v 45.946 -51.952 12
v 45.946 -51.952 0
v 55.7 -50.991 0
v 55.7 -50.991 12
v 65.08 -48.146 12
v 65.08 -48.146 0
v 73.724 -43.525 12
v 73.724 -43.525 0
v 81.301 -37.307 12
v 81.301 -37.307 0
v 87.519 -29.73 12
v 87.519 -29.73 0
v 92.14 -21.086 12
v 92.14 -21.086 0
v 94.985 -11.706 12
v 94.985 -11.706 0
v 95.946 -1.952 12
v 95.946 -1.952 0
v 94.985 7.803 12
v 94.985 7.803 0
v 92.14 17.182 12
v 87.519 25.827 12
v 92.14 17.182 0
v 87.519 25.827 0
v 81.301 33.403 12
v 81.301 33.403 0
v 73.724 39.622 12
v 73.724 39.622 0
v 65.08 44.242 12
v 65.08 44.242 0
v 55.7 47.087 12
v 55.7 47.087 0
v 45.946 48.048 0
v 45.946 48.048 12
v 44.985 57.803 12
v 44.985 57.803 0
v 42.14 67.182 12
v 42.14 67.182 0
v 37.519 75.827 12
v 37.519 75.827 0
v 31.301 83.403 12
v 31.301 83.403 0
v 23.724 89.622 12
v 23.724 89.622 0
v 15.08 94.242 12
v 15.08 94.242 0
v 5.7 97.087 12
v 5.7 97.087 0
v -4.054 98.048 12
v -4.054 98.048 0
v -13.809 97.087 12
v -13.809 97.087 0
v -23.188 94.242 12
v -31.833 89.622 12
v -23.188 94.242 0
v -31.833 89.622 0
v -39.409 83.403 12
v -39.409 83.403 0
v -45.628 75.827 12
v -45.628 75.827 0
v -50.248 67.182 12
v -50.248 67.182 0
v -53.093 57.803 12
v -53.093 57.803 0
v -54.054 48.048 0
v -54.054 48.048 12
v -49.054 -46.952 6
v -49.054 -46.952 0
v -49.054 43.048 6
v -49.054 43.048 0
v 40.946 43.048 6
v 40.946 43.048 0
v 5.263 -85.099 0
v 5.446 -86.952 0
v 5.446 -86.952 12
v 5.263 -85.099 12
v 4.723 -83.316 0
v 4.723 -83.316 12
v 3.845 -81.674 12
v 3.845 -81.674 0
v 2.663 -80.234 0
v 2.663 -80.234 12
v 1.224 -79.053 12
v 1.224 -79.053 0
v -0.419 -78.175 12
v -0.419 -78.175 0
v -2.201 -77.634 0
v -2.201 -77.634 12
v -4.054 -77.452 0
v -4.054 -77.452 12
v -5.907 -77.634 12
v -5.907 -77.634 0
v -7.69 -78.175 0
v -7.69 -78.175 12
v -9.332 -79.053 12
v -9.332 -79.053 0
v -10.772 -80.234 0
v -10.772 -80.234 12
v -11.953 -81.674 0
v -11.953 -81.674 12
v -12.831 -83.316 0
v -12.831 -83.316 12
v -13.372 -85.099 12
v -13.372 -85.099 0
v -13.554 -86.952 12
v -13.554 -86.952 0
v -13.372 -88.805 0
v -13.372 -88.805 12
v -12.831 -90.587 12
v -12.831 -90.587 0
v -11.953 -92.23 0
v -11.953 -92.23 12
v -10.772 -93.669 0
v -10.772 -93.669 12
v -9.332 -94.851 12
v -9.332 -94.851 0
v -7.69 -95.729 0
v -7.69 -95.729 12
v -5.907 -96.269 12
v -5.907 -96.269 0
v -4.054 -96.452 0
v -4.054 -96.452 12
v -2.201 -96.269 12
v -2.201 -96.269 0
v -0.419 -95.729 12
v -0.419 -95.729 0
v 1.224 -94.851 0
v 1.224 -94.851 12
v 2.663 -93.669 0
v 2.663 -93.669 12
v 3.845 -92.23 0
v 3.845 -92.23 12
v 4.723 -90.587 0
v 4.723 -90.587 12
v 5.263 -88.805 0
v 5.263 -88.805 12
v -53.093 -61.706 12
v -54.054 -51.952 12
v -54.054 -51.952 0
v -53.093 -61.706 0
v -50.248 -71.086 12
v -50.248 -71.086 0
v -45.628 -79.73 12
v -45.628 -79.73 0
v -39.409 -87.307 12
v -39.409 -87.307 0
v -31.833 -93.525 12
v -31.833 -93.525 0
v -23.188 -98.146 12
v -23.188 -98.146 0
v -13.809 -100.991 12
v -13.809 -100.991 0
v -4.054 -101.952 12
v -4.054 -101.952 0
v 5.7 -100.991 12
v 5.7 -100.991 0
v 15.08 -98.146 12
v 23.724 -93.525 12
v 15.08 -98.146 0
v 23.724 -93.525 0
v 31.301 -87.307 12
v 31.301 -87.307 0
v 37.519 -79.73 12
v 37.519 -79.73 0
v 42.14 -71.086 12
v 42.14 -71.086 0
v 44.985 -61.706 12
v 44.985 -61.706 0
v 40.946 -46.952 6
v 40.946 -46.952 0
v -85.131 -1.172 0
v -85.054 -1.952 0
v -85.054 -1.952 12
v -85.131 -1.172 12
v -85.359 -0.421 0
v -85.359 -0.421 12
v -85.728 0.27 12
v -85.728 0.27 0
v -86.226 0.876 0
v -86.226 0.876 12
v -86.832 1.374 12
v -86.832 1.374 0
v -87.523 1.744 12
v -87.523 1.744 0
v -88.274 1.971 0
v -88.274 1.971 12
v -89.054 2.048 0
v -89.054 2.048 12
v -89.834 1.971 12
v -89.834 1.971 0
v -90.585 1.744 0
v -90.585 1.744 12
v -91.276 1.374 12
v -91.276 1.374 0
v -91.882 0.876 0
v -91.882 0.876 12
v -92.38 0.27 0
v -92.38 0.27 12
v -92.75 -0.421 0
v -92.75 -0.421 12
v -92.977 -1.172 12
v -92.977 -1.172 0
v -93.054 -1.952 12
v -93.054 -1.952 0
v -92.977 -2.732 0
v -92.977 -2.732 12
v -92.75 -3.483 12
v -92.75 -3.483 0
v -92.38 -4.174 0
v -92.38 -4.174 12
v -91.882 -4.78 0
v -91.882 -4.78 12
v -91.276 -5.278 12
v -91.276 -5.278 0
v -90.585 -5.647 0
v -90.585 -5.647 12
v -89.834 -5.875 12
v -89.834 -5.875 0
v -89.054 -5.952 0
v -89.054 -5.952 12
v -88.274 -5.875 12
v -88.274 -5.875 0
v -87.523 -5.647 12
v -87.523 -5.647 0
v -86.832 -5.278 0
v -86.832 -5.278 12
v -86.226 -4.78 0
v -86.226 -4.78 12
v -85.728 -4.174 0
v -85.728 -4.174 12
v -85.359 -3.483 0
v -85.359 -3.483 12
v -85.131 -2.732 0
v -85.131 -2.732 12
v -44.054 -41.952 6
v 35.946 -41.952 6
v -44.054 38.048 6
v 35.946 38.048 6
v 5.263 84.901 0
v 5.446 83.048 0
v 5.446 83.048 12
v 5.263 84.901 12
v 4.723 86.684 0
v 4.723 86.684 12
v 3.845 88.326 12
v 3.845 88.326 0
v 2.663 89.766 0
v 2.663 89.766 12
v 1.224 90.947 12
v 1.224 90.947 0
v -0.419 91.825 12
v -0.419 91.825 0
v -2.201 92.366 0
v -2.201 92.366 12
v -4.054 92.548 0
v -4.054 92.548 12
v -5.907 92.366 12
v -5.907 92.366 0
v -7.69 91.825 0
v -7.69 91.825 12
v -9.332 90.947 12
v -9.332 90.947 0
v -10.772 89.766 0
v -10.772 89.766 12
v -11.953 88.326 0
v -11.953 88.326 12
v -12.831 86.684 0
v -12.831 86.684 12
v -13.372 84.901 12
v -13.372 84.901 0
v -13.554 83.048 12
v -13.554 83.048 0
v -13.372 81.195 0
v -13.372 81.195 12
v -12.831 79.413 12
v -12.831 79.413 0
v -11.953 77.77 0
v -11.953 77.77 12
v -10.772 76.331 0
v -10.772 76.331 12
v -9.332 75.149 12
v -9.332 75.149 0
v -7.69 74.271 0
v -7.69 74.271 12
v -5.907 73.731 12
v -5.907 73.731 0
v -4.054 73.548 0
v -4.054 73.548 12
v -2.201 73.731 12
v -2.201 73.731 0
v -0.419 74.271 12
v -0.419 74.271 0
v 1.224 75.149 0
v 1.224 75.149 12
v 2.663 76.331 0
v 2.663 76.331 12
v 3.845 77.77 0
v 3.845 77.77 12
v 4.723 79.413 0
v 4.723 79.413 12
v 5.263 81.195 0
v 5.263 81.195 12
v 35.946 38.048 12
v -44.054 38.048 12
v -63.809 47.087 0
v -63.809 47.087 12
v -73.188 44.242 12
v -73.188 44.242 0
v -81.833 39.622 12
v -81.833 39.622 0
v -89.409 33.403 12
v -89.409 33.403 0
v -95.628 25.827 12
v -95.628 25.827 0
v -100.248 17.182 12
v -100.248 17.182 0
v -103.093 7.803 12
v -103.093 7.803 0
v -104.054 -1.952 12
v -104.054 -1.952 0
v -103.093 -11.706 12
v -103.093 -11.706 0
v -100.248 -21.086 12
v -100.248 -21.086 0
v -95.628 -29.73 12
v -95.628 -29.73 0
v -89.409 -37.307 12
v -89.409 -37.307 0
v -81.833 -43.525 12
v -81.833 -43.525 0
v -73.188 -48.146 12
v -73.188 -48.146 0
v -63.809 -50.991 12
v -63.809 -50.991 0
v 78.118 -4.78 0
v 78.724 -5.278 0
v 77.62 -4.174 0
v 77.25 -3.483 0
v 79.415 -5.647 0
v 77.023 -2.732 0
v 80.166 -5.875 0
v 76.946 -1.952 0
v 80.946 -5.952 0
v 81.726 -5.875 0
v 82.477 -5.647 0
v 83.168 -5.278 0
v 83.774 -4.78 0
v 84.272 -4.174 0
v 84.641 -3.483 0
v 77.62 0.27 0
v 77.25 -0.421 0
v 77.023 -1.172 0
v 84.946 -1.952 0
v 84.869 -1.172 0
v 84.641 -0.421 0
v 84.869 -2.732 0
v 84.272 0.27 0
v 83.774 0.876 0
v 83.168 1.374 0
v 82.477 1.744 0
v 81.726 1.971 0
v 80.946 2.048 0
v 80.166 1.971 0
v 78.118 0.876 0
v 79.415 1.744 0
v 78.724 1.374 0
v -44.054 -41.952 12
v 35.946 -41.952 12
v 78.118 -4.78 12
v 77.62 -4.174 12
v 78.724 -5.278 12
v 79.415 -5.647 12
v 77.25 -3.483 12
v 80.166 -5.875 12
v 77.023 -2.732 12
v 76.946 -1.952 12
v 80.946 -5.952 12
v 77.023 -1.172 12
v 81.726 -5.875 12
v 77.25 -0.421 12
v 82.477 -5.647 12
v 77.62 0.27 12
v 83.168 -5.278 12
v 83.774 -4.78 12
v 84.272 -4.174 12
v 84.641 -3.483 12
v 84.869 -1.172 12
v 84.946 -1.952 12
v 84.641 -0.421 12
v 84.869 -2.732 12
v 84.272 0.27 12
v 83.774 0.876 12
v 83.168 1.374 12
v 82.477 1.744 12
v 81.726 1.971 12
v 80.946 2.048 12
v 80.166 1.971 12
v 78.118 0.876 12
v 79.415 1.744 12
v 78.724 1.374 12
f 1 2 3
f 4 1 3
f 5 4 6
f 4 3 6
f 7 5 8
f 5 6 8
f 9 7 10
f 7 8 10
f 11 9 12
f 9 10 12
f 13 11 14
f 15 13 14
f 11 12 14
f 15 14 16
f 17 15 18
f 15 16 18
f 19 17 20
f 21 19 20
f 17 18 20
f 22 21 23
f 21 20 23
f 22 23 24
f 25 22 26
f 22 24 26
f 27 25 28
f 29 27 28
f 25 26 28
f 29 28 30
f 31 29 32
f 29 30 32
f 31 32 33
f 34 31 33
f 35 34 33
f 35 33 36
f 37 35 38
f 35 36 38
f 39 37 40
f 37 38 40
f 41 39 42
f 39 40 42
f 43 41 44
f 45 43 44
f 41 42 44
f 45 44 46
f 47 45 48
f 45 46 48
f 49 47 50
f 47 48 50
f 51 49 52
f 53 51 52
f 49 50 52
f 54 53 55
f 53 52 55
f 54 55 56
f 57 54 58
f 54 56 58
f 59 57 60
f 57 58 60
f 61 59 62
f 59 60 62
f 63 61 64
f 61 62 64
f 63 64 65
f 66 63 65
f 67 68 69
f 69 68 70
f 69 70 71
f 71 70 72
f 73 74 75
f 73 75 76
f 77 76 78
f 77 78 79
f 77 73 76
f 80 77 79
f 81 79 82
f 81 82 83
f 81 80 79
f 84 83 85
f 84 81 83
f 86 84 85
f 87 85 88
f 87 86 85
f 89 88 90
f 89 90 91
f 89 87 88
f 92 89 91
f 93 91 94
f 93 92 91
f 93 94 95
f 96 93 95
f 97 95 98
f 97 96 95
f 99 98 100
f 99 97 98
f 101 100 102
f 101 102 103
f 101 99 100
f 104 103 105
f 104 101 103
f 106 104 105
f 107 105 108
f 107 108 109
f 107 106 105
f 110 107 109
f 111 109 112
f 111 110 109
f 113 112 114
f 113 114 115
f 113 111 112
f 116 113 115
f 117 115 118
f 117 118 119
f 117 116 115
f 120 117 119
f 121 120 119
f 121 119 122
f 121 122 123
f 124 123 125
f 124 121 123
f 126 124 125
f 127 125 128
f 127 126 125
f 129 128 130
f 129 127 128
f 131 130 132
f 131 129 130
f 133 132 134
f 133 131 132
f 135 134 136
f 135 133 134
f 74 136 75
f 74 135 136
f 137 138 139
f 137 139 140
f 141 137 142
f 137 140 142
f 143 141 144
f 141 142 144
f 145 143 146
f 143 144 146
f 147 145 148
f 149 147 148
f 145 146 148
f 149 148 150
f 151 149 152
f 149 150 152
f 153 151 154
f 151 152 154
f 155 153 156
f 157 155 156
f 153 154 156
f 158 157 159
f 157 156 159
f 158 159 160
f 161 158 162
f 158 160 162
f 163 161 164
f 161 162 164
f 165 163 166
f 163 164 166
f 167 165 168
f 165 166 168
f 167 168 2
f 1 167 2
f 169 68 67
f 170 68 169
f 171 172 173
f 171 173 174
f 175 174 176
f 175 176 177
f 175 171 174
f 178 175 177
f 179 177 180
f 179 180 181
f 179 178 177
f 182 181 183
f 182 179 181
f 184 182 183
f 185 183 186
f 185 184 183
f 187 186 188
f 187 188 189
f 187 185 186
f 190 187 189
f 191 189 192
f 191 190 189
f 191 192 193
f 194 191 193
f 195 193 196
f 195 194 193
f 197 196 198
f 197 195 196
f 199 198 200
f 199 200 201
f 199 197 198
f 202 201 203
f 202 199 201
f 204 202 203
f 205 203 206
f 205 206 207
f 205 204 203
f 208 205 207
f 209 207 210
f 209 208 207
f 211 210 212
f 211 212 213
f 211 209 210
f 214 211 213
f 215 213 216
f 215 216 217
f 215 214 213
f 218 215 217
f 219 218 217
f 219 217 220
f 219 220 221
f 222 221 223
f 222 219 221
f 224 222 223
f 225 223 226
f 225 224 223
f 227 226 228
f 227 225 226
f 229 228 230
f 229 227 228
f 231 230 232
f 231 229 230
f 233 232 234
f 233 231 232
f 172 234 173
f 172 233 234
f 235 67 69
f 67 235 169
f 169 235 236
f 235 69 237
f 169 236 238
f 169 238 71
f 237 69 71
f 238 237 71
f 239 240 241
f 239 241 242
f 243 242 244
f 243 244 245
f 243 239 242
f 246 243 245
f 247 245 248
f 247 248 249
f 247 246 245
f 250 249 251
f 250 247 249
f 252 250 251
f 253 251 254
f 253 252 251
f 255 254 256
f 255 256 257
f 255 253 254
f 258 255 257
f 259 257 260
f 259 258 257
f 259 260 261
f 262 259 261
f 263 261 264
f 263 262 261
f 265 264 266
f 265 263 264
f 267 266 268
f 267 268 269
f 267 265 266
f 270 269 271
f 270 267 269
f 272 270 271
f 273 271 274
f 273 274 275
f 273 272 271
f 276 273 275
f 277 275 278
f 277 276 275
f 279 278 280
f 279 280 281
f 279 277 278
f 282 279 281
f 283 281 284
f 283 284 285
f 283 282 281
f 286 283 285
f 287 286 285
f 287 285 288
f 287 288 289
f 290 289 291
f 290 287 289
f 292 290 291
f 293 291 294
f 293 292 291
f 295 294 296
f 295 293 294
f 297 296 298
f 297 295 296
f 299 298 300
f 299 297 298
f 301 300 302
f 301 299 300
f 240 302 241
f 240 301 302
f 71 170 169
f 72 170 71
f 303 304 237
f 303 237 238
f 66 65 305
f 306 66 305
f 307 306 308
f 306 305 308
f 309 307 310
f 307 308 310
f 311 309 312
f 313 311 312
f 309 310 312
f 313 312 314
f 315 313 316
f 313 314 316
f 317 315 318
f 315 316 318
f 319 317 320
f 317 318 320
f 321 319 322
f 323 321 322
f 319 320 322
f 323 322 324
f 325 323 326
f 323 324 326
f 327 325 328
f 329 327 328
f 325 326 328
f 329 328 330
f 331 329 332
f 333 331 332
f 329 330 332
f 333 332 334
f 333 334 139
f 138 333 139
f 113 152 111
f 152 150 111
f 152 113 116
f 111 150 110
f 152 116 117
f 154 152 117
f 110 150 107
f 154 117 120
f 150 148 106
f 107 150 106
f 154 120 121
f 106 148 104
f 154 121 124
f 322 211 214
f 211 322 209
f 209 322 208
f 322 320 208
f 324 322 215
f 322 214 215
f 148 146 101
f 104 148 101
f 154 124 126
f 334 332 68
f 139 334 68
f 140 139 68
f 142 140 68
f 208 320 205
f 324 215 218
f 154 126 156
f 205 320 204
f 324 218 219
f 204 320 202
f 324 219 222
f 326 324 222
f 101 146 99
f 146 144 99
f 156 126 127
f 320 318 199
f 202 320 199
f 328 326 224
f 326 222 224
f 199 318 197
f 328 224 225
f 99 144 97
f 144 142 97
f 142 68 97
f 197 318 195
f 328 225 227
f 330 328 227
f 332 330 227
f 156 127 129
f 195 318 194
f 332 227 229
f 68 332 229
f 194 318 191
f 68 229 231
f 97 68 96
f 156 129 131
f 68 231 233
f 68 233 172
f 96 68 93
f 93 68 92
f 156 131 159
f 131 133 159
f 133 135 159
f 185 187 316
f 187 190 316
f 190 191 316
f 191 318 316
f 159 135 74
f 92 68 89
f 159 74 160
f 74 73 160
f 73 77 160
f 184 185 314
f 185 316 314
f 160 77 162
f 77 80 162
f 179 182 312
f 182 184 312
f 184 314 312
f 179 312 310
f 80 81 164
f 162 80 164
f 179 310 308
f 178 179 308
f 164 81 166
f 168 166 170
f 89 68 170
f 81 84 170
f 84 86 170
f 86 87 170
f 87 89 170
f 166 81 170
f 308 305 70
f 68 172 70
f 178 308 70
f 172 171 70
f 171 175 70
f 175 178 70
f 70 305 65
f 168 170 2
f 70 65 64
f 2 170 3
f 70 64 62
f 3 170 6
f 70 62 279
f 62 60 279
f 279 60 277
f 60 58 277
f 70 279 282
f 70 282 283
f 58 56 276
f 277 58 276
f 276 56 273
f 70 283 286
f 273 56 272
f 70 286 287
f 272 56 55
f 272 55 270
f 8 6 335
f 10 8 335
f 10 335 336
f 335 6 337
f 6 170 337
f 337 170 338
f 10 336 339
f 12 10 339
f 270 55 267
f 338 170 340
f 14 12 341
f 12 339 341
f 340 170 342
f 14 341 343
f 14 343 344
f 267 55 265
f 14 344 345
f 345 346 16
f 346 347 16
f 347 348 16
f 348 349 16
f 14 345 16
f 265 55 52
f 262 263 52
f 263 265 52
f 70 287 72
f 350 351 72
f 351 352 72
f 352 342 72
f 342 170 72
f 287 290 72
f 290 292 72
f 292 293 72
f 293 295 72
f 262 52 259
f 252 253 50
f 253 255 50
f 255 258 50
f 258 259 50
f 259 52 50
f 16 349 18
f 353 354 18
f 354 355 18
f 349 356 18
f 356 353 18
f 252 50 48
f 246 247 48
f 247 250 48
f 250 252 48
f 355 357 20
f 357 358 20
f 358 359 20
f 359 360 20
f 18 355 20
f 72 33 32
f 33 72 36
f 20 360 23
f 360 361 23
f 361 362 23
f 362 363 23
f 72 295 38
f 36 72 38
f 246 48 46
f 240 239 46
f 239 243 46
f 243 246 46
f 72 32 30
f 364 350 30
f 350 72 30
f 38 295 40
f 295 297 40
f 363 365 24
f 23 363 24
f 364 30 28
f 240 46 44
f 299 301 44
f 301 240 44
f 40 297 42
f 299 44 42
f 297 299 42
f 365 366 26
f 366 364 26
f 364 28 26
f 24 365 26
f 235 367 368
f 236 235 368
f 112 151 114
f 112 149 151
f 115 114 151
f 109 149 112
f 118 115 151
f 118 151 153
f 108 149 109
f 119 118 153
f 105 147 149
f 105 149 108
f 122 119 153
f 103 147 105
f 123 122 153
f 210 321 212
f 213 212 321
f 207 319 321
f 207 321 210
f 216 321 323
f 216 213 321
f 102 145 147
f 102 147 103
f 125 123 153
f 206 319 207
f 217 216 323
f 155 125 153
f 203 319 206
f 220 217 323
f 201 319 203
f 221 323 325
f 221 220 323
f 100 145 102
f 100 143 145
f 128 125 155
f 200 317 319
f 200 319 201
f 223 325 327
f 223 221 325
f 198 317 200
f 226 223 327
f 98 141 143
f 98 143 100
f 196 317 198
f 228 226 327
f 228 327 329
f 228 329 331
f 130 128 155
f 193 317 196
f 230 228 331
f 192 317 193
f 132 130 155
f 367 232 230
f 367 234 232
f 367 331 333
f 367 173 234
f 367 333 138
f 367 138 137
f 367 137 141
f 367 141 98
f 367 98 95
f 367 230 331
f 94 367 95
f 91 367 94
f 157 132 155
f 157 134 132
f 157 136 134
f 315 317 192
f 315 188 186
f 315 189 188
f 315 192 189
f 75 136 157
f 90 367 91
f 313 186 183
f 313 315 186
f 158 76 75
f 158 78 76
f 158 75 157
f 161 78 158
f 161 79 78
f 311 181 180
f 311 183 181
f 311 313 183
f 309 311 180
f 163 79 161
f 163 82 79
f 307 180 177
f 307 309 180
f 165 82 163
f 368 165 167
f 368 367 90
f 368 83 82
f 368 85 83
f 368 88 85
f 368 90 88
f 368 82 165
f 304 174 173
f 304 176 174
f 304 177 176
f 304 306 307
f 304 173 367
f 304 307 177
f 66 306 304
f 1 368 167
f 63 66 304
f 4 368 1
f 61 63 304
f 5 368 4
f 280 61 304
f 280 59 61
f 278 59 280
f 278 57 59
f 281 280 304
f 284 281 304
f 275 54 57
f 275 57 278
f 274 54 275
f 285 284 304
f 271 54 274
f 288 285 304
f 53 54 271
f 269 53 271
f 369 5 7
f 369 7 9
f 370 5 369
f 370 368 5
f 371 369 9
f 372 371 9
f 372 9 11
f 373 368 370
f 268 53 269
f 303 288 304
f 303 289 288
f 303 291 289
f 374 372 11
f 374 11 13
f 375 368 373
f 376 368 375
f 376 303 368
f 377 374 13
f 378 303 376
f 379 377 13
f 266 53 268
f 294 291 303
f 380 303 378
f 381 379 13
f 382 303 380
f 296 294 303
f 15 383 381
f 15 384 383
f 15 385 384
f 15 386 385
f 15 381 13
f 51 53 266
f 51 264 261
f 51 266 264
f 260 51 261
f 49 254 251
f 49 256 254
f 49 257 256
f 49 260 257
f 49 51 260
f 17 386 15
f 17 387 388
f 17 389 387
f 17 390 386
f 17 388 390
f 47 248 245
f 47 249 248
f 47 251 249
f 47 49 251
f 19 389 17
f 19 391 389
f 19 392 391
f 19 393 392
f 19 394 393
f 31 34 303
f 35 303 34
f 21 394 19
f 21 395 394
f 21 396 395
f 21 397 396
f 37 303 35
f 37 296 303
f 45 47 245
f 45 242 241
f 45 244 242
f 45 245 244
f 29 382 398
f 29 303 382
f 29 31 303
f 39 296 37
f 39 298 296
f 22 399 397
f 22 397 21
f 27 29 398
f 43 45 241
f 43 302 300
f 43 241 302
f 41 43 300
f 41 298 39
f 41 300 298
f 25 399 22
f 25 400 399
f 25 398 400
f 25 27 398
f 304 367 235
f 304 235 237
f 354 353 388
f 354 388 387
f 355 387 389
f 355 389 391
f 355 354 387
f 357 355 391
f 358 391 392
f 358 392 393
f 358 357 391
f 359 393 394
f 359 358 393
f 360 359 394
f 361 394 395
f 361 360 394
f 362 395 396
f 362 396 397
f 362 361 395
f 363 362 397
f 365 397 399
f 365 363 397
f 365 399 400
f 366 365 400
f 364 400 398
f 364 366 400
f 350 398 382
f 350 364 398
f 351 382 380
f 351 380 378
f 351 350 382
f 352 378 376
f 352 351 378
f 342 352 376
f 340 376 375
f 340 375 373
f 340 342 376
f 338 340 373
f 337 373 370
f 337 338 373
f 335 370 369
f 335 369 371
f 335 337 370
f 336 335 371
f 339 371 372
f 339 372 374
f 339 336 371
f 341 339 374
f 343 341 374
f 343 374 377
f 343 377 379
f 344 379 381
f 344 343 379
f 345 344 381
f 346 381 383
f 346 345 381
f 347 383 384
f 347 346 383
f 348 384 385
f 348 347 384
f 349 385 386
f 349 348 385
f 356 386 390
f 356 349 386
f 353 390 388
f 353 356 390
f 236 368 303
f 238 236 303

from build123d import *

# Parameters (mm, degrees)
IZIM1_R                     = 9.5
IZIM1_R_2                   = 4
IZIM1_W                     = 90
IZIM1_H                     = 90
Y_KSEKLIK_EKSTR_ZYON1_DEPTH = 12
IZIM2_W                     = 90
IZIM2_H                     = 90
IZIM2_W_2                   = 80
IZIM2_H_2                   = 80
Y_KSEKLIK_EKSTR_ZYON2_DEPTH = 6


with BuildPart() as part:
    # Çizim1 → Yükseklik-Ekstrüzyon1 (new body)
    with BuildSketch(Plane.XY):
        with BuildLine():
            ThreePointArc((45.945945946, 48.048048048), (-4.054054054, 98.048048048), (-54.054054054, 48.048048048))
            ThreePointArc((-54.054054054, 48.048048048), (-104.054054054, -1.951951952), (-54.054054054, -51.951951952))
            ThreePointArc((-54.054054054, -51.951951952), (-4.054054054, -101.951951952), (45.945945946, -51.951951952))
            ThreePointArc((45.945945946, -51.951951952), (95.945945946, -1.951951952), (45.945945946, 48.048048048))
        make_face()
        with Locations((-4.054054054, -86.951951952)):
            Circle(IZIM1_R, mode=Mode.SUBTRACT)
        with Locations((-89.054054054, -1.951951952)):
            Circle(IZIM1_R_2, mode=Mode.SUBTRACT)
        with Locations((-4.054054054, 83.048048048)):
            Circle(IZIM1_R, mode=Mode.SUBTRACT)
        with Locations((80.945945946, -1.951951952)):
            Circle(IZIM1_R_2, mode=Mode.SUBTRACT)
        with Locations((-4.054054054, -1.951951952)):
            Rectangle(IZIM1_W, IZIM1_H, mode=Mode.SUBTRACT)
    extrude(amount=Y_KSEKLIK_EKSTR_ZYON1_DEPTH)

    # Çizim2 → Yükseklik-Ekstrüzyon2 (add)
    with BuildSketch(Plane.XY.offset(12)):
        with Locations((-4.054054054, -1.951951952)):
            Rectangle(IZIM2_W, IZIM2_H)
        with Locations((-4.054054054, -1.951951952)):
            Rectangle(IZIM2_W_2, IZIM2_H_2, mode=Mode.SUBTRACT)
    extrude(amount=-Y_KSEKLIK_EKSTR_ZYON2_DEPTH)


solid = part.part
